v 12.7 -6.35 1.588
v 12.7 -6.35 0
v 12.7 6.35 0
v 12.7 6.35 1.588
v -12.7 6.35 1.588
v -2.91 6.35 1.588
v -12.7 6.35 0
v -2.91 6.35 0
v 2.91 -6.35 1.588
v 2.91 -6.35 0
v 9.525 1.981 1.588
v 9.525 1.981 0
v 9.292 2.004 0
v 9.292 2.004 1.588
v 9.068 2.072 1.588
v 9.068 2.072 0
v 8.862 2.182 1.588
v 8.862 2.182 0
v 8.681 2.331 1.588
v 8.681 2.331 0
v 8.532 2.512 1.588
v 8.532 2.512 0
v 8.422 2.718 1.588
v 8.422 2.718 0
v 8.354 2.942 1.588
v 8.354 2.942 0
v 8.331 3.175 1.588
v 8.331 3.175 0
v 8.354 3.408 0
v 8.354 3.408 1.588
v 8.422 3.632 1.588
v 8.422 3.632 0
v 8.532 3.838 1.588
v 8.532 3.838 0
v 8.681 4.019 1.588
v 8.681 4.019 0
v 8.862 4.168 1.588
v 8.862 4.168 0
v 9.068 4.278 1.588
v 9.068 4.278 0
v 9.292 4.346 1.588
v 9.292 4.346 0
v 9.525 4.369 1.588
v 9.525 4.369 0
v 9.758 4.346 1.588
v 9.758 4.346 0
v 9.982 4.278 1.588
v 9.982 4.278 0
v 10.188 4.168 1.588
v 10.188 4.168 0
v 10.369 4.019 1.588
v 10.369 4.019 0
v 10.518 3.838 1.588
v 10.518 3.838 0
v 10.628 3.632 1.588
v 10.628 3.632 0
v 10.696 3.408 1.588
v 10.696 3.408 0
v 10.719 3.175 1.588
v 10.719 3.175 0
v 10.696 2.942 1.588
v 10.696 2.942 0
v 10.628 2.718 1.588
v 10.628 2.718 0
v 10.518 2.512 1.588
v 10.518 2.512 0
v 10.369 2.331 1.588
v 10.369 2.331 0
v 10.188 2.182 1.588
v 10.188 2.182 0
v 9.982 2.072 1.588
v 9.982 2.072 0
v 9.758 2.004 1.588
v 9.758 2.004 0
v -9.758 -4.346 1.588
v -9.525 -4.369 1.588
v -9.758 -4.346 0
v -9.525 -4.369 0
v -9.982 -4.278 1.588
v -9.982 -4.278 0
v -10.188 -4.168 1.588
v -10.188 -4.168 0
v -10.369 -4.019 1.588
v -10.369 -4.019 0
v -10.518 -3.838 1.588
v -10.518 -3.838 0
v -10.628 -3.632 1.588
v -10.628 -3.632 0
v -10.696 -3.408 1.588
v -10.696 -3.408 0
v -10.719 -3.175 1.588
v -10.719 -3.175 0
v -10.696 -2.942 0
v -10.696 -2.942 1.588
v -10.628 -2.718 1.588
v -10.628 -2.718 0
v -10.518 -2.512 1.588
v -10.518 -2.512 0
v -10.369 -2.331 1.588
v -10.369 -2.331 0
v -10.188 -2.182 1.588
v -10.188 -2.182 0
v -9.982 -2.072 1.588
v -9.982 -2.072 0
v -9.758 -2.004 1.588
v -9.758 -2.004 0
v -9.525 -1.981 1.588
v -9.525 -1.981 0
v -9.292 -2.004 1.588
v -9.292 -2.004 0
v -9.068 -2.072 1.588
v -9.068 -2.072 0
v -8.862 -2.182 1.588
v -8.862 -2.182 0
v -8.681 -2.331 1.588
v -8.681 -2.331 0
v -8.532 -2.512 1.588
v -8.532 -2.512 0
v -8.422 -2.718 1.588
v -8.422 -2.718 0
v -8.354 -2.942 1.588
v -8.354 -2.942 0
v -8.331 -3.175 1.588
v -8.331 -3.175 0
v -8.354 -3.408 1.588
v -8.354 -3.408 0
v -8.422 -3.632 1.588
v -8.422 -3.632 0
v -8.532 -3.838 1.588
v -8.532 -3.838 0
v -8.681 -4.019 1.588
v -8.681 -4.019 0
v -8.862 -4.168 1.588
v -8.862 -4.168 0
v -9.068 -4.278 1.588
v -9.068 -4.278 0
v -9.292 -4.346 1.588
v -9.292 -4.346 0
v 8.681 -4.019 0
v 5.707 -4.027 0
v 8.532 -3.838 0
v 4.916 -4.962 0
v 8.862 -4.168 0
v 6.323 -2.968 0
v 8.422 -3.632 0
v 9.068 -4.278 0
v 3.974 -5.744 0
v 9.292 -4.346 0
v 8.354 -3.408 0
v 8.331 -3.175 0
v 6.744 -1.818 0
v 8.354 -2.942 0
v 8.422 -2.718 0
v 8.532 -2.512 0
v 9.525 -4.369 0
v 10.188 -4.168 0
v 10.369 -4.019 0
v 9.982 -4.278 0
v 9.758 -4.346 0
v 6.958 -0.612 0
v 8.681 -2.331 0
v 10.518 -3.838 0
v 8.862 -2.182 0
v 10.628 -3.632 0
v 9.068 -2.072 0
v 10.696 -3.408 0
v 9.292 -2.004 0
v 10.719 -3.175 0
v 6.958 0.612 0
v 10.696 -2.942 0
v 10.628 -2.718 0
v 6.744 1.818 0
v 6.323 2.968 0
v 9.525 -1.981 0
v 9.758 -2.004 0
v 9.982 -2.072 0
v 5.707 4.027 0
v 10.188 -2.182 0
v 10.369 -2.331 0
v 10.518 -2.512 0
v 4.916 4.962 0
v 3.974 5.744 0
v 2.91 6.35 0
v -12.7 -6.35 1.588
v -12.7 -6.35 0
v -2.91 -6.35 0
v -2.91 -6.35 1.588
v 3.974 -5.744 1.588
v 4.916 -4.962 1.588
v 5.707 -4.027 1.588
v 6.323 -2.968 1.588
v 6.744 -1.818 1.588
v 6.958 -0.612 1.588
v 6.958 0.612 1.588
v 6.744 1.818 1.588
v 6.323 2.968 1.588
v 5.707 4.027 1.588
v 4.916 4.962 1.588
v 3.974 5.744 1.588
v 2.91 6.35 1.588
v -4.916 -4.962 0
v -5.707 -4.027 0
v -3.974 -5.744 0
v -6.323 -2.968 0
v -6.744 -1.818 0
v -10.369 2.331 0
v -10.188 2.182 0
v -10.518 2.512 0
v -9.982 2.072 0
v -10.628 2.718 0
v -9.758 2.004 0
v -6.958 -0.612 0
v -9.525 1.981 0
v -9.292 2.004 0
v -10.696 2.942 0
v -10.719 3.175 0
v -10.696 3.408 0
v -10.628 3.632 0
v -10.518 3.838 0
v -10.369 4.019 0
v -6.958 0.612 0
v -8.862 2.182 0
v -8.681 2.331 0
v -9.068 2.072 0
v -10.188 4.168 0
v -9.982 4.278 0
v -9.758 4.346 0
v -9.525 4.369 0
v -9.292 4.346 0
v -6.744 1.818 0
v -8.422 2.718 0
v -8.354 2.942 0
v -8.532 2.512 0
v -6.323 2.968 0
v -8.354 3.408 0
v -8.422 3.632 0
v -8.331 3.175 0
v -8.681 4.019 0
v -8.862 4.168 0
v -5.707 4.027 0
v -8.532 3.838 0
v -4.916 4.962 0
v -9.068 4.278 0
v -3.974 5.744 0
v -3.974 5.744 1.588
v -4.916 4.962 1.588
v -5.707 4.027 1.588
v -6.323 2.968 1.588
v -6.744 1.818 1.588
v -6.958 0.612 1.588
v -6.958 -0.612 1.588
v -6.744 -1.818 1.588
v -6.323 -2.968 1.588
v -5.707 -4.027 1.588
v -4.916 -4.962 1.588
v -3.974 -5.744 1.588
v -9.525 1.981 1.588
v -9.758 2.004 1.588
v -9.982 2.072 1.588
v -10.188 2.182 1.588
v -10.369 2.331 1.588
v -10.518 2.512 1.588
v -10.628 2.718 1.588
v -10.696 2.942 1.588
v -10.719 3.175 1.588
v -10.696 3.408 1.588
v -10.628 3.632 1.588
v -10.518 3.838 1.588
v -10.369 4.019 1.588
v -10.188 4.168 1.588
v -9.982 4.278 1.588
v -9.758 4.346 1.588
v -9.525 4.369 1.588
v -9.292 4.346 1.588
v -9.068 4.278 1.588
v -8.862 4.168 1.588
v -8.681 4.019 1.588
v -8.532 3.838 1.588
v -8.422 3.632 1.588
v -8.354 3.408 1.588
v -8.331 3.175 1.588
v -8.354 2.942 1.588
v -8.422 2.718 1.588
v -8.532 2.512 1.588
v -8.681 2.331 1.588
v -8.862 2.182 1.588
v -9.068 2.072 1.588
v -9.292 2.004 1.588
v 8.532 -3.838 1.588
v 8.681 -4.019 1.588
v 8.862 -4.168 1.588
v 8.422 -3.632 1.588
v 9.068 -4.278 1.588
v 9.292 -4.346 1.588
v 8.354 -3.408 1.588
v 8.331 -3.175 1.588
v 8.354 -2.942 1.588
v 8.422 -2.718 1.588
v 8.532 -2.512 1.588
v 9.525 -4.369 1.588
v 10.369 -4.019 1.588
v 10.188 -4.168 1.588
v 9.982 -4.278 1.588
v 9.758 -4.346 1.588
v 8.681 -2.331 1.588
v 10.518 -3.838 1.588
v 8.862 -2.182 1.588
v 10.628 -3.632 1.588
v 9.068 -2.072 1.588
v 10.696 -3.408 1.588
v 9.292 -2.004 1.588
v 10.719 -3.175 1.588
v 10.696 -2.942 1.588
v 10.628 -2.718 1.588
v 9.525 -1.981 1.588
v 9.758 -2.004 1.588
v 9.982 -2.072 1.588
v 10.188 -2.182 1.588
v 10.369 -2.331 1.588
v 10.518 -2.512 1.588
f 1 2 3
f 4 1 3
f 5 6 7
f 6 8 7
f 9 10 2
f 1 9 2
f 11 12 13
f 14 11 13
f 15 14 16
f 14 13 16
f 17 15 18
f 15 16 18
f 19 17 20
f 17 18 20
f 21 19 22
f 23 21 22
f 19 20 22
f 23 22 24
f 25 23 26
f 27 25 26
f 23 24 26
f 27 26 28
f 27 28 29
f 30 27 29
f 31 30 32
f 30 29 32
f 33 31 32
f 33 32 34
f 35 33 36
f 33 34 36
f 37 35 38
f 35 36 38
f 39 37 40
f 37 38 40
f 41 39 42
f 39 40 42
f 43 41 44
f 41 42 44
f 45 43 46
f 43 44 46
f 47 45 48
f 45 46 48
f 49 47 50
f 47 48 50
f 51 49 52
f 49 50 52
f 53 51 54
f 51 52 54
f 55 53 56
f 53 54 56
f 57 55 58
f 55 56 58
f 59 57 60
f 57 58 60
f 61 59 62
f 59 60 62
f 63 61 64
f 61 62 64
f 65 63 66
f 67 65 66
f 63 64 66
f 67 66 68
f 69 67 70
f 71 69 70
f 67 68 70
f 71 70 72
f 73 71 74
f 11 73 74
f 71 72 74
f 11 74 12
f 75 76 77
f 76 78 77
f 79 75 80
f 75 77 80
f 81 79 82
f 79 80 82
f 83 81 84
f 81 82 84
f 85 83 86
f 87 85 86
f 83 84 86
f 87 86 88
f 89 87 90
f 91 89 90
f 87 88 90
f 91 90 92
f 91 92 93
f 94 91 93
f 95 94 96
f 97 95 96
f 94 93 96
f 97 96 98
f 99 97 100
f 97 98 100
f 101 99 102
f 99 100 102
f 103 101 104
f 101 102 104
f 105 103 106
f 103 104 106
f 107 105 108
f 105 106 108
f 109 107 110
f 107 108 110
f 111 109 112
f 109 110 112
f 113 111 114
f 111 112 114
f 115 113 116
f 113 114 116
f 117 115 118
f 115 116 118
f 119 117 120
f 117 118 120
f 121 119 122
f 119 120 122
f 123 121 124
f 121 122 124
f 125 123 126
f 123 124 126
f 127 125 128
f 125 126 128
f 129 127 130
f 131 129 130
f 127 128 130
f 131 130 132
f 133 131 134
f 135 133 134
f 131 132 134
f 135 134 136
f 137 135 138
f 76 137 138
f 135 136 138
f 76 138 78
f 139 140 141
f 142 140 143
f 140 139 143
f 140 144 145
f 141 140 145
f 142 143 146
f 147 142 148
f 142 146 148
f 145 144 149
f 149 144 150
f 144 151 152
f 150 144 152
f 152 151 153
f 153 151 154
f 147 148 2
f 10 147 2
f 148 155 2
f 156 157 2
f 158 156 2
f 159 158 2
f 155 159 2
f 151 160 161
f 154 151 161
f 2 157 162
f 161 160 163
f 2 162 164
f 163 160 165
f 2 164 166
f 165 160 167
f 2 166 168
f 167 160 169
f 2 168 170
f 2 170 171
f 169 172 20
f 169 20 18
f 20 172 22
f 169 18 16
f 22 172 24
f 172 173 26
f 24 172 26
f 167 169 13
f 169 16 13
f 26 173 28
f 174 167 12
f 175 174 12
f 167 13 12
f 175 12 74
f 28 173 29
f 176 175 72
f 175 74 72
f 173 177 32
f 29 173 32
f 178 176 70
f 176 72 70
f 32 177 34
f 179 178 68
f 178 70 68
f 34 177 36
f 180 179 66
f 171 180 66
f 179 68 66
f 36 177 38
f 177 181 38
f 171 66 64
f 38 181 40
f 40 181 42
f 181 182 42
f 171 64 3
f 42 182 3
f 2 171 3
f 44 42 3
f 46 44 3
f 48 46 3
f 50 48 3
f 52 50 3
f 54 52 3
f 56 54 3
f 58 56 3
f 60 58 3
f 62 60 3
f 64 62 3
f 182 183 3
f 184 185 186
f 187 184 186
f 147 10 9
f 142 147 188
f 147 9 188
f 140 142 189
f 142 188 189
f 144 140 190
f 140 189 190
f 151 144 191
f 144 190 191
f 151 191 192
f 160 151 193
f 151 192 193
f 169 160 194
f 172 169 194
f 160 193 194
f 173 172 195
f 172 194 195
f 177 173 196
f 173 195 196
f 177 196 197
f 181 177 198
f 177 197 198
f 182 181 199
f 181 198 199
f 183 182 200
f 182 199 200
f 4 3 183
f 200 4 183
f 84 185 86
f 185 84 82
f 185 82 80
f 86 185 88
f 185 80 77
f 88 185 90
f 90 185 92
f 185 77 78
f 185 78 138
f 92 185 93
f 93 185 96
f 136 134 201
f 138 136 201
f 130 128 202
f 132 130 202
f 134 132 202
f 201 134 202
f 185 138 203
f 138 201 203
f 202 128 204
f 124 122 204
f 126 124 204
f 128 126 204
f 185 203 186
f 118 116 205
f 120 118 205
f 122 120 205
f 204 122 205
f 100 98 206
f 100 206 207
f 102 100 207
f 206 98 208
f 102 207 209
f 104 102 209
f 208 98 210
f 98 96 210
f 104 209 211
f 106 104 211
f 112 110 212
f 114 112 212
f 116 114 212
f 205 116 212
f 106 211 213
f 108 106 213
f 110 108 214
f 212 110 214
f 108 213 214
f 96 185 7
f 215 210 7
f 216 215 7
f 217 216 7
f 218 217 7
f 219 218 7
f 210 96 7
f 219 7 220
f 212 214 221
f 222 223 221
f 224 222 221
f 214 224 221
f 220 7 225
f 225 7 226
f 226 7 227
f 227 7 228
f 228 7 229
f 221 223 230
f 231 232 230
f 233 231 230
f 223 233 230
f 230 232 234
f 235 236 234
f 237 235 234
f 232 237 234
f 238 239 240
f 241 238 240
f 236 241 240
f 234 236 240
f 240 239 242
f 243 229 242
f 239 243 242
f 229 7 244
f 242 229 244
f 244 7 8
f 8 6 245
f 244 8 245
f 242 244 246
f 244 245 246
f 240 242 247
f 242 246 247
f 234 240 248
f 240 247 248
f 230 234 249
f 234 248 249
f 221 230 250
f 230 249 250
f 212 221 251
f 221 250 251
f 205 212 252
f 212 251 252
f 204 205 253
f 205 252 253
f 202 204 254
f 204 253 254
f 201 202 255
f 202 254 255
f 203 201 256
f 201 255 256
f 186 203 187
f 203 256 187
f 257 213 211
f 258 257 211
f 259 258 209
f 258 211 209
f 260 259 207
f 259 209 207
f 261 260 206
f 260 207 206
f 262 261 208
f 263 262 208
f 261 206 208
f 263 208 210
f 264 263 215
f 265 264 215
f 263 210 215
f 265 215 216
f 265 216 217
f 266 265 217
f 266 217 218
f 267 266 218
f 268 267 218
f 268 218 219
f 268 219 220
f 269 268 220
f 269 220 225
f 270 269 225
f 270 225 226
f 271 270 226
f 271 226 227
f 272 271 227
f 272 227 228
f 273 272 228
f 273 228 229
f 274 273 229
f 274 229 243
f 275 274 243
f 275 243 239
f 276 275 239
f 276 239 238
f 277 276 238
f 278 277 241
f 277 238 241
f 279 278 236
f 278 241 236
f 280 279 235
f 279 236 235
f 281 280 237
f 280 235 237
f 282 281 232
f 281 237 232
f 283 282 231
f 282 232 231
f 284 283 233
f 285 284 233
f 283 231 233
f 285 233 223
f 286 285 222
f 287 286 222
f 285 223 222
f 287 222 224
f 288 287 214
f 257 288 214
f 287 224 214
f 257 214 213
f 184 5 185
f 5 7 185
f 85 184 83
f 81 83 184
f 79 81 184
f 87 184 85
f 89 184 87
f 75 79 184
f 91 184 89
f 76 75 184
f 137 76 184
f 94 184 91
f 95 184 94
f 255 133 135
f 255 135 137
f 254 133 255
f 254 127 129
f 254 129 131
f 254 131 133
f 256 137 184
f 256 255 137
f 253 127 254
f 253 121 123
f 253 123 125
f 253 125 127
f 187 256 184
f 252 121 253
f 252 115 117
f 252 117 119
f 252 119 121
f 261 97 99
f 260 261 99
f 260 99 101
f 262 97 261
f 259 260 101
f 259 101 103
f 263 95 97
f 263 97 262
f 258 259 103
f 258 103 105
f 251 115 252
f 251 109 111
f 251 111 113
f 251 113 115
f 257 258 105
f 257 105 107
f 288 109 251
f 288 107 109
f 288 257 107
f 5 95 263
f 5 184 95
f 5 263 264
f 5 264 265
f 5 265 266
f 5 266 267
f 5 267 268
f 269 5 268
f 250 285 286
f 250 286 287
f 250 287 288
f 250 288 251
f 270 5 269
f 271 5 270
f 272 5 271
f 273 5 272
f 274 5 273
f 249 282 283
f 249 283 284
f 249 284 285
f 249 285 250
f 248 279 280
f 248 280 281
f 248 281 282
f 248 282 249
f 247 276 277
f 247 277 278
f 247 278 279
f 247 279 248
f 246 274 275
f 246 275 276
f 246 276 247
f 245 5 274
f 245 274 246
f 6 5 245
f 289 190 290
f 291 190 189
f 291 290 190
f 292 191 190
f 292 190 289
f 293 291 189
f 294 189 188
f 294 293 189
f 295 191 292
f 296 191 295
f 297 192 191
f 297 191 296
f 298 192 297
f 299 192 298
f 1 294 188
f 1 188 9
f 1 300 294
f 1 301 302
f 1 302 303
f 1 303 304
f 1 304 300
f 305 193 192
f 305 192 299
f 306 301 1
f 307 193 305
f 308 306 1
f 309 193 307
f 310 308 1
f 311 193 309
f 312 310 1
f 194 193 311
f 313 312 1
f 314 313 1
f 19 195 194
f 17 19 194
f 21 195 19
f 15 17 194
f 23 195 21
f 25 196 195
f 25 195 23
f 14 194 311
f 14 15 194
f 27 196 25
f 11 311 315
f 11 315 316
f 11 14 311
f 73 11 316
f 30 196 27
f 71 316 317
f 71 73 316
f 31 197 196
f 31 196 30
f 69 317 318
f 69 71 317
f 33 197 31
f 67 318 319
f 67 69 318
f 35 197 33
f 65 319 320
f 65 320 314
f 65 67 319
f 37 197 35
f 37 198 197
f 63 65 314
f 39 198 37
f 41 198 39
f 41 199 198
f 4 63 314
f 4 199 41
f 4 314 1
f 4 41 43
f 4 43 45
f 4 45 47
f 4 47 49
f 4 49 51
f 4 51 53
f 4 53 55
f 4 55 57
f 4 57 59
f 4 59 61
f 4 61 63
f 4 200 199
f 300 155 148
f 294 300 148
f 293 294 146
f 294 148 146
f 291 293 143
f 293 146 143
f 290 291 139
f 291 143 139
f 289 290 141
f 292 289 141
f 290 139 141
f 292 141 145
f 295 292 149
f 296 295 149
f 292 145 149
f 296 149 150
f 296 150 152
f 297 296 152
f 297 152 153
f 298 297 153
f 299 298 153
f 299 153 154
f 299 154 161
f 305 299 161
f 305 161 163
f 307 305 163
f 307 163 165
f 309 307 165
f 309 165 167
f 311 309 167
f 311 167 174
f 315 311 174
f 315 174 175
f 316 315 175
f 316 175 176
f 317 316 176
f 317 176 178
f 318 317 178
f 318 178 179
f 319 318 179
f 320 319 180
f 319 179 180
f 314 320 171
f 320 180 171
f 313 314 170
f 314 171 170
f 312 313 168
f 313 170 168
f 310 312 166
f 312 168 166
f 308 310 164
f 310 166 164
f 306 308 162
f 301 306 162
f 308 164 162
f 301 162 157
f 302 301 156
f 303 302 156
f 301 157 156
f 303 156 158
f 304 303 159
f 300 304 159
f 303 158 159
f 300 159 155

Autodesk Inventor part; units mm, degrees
ref_plane "YZ Plane" through (0, 0, 0) normal (1, 0, 0) x (0, 1, 0)
ref_plane "XZ Plane" through (0, 0, 0) normal (0, 1, 0) x (-1, 0, 0)
ref_plane "XY Plane" through (0, 0, 0) normal (0, 0, 1) x (1, 0, 0)
sketch "Sketch1" plane through (0, 0, 0) normal (0, 0, 1) x (1, 0, 0)
  line L0 (-12.7, -6.35) -> (12.7, -6.35)
  line L1 (12.7, -6.35) -> (12.7, 6.35)
  line L2 (12.7, 6.35) -> (-12.7, 6.35)
  line L3 (-12.7, 6.35) -> (-12.7, -6.35)
  point P0 (0, 0)
  dimension "d0" = 25.4
  dimension "d1" = 12.7
extrude "Extrusion1" add sketch "Sketch1" along normal blind 1.5875
sketch "Sketch2" plane through (0, 0, 1.5875) normal (0, 0, 1) x (1, 0, 0)
  circle A0 centre (0, 0) radius 6.985
  dimension "d4" = 13.97
extrude "Extrusion2" cut sketch "Sketch2" against normal through all
sketch "Sketch6" plane through (0, 0, 1.5875) normal (0, 0, 1) x (1, 0, 0)
  point P0 (0, 0)
  point P1 (-9.525, -3.175)
  point P2 (-9.525, 3.175)
  point P3 (9.525, 3.175)
  point P4 (9.525, -3.175)
hole "Hole3" at (-9.525, -3.175, 1.5875) at (-9.525, 3.175, 1.5875) at (9.525, 3.175, 1.5875) at (9.525, -3.175, 1.5875) direction (0, 0, -1) diameter 2.3876 depth 25.4 tip angle 118 clearance for "Flat Head Machine Screw" size "M2" standard "Ansi Metric M Profile"
properties part number "al_collar"
